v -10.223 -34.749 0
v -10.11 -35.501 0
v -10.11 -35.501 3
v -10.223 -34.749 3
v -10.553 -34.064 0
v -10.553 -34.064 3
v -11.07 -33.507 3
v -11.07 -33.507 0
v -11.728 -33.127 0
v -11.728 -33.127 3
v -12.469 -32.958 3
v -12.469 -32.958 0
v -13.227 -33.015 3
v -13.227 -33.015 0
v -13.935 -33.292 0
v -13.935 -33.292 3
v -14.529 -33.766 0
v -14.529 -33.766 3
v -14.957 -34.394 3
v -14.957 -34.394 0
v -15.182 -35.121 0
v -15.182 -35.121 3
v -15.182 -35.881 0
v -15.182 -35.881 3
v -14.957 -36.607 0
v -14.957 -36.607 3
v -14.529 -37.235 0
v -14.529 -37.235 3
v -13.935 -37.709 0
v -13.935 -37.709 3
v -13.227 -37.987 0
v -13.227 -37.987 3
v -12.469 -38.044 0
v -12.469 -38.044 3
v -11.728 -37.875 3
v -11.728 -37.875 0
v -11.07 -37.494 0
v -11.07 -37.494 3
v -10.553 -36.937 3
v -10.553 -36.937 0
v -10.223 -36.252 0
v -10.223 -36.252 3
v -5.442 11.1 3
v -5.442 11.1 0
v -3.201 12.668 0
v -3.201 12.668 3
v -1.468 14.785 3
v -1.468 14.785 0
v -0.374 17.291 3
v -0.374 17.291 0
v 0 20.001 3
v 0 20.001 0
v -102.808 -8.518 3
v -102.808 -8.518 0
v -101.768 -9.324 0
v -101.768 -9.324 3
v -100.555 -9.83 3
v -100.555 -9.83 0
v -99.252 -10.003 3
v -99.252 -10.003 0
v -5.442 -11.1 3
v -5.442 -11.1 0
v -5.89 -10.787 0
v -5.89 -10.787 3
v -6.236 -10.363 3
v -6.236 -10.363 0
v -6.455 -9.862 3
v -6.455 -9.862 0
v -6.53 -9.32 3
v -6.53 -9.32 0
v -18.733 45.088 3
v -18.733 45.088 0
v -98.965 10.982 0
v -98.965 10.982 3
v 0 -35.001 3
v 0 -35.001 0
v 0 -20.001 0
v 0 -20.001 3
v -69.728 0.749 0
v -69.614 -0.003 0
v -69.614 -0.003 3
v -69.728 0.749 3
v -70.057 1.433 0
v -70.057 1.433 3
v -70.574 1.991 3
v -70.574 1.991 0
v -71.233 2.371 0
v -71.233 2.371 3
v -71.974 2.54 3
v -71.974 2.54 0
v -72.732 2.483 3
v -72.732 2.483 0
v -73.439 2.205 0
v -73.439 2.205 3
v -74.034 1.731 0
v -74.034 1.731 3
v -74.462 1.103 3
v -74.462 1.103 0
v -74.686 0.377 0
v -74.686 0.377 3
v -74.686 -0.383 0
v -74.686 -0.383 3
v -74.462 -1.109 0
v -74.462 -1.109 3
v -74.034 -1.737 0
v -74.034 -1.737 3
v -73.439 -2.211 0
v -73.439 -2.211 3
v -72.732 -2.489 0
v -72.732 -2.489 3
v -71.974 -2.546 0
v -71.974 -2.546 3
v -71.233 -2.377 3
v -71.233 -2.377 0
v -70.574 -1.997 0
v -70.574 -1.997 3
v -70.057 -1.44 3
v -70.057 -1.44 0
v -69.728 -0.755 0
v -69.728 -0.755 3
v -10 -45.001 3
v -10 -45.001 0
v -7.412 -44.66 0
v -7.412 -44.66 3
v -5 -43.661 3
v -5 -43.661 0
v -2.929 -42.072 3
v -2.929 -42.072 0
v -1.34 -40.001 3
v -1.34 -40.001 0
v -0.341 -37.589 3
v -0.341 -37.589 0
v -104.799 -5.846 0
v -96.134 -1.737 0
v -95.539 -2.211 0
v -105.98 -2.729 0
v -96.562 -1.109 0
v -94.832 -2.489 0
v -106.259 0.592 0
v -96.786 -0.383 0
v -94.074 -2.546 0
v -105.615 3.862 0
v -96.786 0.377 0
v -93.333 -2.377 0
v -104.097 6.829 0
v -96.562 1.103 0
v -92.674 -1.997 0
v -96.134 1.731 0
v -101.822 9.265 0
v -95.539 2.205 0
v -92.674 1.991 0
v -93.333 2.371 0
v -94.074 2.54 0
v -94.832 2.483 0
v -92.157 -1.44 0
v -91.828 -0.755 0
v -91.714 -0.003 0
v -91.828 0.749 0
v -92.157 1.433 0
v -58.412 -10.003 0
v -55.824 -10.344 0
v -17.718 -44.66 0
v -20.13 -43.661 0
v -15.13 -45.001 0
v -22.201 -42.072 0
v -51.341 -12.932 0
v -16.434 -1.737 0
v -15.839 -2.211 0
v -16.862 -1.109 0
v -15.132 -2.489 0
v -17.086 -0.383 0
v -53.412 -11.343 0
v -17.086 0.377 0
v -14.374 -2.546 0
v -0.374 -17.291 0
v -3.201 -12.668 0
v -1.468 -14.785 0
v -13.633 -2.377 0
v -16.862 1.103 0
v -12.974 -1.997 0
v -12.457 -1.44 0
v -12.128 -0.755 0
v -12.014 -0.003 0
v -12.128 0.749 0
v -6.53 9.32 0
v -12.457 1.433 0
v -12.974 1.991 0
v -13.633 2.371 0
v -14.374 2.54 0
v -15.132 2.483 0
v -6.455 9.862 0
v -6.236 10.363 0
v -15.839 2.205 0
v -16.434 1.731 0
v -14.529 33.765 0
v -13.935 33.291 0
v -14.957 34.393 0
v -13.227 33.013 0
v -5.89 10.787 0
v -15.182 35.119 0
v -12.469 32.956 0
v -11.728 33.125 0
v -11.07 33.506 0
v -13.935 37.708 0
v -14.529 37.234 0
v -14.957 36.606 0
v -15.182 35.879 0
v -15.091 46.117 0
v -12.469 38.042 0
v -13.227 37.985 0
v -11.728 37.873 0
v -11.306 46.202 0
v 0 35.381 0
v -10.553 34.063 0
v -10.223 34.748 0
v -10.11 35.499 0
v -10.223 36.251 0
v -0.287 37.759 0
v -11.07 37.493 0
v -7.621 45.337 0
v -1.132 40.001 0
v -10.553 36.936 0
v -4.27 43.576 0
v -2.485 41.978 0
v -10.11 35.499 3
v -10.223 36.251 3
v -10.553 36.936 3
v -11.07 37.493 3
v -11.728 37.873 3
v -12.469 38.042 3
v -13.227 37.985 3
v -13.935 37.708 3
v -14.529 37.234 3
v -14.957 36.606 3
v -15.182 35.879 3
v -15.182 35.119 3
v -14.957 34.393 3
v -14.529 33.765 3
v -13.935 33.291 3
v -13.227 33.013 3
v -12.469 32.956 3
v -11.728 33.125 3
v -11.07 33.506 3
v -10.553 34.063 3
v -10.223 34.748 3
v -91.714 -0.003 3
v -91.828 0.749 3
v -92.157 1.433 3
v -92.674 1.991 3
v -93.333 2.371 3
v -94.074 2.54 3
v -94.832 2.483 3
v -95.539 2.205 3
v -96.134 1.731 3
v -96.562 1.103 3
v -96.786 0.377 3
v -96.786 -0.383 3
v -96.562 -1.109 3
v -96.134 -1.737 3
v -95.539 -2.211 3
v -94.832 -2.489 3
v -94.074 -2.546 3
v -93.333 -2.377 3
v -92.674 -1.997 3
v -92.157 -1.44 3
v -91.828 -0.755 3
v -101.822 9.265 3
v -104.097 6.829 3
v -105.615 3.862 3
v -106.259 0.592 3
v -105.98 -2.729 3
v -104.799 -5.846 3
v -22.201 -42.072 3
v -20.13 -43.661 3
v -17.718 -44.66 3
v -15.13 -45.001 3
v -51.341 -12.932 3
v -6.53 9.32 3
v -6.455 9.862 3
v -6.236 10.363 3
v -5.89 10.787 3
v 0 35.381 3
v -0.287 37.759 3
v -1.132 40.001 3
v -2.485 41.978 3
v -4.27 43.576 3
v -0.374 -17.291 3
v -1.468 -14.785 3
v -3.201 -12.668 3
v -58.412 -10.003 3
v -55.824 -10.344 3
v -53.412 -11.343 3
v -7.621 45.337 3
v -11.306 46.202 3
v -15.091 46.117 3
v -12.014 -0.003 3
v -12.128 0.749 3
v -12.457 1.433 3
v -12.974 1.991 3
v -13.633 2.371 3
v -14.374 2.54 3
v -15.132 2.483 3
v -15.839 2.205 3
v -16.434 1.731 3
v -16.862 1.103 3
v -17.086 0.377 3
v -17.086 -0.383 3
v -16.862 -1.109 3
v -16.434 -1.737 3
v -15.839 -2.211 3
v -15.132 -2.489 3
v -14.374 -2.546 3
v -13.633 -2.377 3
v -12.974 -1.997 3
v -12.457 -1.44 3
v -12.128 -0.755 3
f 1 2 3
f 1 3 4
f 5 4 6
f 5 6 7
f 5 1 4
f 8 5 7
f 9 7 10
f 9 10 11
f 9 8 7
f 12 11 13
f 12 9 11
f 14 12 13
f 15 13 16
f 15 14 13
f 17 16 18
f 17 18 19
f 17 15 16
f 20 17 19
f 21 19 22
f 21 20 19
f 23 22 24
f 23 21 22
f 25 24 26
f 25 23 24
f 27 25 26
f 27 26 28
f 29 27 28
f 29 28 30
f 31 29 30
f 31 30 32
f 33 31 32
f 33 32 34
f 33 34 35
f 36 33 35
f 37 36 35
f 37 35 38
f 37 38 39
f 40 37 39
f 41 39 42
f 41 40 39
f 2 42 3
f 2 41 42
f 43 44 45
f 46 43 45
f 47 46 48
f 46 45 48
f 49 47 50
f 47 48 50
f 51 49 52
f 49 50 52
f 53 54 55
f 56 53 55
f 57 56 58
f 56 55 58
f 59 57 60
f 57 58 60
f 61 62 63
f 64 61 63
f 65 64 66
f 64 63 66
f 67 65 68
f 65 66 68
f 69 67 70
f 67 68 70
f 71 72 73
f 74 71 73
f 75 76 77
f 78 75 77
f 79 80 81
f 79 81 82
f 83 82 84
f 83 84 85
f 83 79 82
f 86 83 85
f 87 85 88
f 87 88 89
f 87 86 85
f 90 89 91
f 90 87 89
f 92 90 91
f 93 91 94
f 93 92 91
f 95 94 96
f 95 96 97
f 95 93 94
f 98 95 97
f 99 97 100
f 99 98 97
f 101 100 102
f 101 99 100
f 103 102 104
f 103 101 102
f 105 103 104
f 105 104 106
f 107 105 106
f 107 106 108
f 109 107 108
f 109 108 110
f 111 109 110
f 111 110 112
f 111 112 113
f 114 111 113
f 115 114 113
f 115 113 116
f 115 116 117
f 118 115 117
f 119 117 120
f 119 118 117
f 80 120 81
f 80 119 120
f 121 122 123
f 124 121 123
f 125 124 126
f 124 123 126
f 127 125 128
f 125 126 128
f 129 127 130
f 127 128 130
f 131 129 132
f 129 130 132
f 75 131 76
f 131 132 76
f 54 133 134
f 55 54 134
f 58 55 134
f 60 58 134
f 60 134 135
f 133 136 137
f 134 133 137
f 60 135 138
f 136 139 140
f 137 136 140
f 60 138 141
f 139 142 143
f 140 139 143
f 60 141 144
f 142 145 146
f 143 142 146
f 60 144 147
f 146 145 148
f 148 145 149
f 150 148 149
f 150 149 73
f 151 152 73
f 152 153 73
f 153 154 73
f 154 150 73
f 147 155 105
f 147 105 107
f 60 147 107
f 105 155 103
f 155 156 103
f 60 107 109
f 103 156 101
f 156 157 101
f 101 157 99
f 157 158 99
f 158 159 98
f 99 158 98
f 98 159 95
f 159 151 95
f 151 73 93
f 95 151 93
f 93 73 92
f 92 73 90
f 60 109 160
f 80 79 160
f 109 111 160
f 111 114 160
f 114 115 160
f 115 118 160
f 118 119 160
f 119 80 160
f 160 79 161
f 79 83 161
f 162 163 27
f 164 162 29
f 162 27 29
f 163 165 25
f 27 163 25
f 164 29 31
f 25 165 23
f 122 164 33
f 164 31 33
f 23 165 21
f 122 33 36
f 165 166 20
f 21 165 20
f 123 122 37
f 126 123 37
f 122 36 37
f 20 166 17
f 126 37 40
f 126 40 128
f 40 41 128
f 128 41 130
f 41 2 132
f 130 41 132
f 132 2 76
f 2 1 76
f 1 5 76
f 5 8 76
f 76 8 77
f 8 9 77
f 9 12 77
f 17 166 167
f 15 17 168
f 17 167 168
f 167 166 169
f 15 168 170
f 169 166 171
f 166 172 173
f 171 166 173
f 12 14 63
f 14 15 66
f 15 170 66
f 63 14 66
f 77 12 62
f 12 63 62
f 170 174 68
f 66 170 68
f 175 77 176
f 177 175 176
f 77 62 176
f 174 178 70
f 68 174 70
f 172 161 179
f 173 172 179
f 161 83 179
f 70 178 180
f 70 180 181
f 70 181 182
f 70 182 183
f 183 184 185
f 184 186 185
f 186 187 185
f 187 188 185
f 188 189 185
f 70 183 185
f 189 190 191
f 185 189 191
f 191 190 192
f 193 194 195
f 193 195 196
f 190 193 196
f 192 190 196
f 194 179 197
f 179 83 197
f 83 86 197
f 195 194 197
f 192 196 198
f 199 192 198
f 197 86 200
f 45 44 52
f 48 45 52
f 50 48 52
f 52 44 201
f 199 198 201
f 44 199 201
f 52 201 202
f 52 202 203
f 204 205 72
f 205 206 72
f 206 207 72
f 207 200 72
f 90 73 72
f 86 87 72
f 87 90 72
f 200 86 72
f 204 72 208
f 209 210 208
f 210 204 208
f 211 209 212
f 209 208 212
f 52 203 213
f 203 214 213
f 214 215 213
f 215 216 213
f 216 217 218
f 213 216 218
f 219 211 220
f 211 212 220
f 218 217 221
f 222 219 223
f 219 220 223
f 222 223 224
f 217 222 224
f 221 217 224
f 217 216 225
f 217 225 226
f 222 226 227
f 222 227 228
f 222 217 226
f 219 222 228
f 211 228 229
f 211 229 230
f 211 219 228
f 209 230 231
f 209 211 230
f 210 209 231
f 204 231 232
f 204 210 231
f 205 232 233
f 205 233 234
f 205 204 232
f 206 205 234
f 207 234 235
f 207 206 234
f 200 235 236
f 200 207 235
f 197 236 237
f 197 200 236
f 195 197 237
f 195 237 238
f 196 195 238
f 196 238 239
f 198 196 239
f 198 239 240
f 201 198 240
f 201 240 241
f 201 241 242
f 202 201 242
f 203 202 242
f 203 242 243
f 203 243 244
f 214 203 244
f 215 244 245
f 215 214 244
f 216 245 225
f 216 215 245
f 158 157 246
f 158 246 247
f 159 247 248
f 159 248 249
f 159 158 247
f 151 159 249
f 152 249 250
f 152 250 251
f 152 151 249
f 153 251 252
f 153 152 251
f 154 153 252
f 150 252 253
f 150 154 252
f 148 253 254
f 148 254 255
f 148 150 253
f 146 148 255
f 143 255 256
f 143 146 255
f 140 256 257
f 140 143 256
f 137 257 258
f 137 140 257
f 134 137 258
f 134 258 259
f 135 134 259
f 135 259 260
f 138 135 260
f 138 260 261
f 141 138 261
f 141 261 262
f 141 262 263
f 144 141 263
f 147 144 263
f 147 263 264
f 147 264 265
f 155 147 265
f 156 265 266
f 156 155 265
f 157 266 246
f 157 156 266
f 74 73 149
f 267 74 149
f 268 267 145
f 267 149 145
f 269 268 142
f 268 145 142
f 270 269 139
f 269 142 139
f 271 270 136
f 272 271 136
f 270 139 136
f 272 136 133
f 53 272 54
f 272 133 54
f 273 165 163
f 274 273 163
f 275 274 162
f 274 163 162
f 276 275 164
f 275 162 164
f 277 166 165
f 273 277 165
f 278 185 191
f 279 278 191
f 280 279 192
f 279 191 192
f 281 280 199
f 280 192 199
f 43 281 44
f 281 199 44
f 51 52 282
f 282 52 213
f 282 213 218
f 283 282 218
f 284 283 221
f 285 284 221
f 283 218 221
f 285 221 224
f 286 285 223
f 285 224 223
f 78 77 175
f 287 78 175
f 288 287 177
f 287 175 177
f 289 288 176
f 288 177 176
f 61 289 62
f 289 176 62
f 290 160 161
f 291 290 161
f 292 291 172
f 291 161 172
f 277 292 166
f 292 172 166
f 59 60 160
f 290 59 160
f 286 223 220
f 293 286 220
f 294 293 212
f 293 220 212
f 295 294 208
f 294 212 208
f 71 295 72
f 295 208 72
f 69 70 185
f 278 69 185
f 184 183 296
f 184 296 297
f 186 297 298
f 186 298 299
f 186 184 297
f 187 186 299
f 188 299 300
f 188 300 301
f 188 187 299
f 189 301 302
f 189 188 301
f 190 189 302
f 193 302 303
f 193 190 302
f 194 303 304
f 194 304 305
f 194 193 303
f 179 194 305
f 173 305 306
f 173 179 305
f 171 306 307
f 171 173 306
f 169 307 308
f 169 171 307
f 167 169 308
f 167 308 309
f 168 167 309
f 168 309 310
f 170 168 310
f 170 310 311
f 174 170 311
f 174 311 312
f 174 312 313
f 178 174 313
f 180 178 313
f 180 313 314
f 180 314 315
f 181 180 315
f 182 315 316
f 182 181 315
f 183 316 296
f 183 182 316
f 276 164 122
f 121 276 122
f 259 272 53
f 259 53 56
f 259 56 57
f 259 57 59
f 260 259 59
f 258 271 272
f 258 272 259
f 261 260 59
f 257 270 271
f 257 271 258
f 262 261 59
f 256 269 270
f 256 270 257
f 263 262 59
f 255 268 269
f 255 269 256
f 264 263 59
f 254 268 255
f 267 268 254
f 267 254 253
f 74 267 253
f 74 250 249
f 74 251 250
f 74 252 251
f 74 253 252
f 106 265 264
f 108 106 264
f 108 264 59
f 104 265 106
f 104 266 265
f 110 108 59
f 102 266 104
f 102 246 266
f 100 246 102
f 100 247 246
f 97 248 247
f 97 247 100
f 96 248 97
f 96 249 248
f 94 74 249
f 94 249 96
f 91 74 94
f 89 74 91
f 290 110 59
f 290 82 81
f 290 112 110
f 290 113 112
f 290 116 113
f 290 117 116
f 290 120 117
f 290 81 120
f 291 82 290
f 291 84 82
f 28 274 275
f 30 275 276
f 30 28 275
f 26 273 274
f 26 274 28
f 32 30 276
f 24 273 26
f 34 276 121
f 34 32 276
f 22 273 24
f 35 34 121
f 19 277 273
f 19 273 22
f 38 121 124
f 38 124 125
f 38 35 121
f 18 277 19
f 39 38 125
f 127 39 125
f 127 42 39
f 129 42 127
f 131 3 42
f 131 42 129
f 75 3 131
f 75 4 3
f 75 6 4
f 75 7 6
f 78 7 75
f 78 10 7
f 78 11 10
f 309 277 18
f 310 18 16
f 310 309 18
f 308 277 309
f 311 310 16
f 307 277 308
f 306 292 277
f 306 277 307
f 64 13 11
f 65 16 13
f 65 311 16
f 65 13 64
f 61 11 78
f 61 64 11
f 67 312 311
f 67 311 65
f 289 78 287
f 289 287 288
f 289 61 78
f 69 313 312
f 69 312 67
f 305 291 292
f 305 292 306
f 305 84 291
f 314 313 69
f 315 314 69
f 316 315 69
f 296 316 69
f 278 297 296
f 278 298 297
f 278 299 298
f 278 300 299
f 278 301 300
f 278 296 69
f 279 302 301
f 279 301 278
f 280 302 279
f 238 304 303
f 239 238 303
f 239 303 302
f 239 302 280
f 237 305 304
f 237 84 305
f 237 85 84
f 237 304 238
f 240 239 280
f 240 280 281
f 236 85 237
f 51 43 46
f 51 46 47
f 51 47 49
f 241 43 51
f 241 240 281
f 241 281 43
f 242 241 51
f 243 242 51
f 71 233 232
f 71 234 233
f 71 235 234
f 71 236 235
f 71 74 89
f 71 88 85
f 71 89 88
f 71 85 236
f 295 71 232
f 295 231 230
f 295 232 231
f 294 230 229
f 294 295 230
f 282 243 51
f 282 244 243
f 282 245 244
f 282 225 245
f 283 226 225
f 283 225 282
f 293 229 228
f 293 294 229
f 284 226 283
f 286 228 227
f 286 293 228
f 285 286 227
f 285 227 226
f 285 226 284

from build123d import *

# Parameters (mm, degrees)
SKETCH1_R           = 2.55
BOSS_EXTRUDE2_DEPTH = 3


with BuildPart() as part:
    # Sketch1 → Boss-Extrude2 (new body)
    with BuildSketch(Plane.XY):
        with BuildLine():
            Line((0, 20.000781807), (0, 35.380781807))
            ThreePointArc((0, 35.380781807), (-1.131516477, 40.001387827), (-4.27, 43.576335479))
            ThreePointArc((-4.27, 43.576335479), (-11.306226361, 46.201792614), (-18.733195752, 45.087507084))
            Line((-18.733195752, 45.087507084), (-98.964962039, 10.981553375))
            ThreePointArc((-98.964962039, 10.981553375), (-106.051053982, 2.24930594), (-102.807556787, -8.518450105))
            ThreePointArc((-102.807556787, -8.518450105), (-101.178529417, -9.616994075), (-99.252006076, -10.003046978))
            Line((-99.252006076, -10.003046978), (-58.412006076, -10.003046978))
            ThreePointArc((-58.412006076, -10.003046978), (-54.585171753, -10.764251653), (-51.340938265, -12.931979166))
            Line((-51.340938265, -12.931979166), (-22.201067812, -42.071849618))
            ThreePointArc((-22.201067812, -42.071849618), (-18.956834324, -44.239577132), (-15.13, -45.000781807))
            Line((-15.13, -45.000781807), (-10, -45.000781807))
            ThreePointArc((-10, -45.000781807), (-2.928932188, -42.071849618), (0, -35.000781807))
            Line((0, -35.000781807), (0, -20.000781807))
            ThreePointArc((0, -20.000781807), (-1.468196752, -14.784621022), (-5.441666667, -11.100130301))
            ThreePointArc((-5.441666667, -11.100130301), (-6.23636065, -10.363232157), (-6.53, -9.32))
            Line((-6.53, -9.32), (-6.53, 9.32))
            ThreePointArc((-6.53, 9.32), (-6.23636065, 10.363232157), (-5.441666667, 11.100130301))
            ThreePointArc((-5.441666667, 11.100130301), (-1.468196752, 14.784621022), (0, 20.000781807))
        make_face()
        with Locations((-94.264328129, -0.003046978)):
            Circle(SKETCH1_R, mode=Mode.SUBTRACT)
        with Locations((-72.164328129, -0.003046978)):
            Circle(SKETCH1_R, mode=Mode.SUBTRACT)
        with Locations((-14.564328129, -0.003046978)):
            Circle(SKETCH1_R, mode=Mode.SUBTRACT)
        with Locations((-12.66, 35.499218193)):
            Circle(SKETCH1_R, mode=Mode.SUBTRACT)
        with Locations((-12.66, -35.500781807)):
            Circle(SKETCH1_R, mode=Mode.SUBTRACT)
    extrude(amount=BOSS_EXTRUDE2_DEPTH)


solid = part.part
